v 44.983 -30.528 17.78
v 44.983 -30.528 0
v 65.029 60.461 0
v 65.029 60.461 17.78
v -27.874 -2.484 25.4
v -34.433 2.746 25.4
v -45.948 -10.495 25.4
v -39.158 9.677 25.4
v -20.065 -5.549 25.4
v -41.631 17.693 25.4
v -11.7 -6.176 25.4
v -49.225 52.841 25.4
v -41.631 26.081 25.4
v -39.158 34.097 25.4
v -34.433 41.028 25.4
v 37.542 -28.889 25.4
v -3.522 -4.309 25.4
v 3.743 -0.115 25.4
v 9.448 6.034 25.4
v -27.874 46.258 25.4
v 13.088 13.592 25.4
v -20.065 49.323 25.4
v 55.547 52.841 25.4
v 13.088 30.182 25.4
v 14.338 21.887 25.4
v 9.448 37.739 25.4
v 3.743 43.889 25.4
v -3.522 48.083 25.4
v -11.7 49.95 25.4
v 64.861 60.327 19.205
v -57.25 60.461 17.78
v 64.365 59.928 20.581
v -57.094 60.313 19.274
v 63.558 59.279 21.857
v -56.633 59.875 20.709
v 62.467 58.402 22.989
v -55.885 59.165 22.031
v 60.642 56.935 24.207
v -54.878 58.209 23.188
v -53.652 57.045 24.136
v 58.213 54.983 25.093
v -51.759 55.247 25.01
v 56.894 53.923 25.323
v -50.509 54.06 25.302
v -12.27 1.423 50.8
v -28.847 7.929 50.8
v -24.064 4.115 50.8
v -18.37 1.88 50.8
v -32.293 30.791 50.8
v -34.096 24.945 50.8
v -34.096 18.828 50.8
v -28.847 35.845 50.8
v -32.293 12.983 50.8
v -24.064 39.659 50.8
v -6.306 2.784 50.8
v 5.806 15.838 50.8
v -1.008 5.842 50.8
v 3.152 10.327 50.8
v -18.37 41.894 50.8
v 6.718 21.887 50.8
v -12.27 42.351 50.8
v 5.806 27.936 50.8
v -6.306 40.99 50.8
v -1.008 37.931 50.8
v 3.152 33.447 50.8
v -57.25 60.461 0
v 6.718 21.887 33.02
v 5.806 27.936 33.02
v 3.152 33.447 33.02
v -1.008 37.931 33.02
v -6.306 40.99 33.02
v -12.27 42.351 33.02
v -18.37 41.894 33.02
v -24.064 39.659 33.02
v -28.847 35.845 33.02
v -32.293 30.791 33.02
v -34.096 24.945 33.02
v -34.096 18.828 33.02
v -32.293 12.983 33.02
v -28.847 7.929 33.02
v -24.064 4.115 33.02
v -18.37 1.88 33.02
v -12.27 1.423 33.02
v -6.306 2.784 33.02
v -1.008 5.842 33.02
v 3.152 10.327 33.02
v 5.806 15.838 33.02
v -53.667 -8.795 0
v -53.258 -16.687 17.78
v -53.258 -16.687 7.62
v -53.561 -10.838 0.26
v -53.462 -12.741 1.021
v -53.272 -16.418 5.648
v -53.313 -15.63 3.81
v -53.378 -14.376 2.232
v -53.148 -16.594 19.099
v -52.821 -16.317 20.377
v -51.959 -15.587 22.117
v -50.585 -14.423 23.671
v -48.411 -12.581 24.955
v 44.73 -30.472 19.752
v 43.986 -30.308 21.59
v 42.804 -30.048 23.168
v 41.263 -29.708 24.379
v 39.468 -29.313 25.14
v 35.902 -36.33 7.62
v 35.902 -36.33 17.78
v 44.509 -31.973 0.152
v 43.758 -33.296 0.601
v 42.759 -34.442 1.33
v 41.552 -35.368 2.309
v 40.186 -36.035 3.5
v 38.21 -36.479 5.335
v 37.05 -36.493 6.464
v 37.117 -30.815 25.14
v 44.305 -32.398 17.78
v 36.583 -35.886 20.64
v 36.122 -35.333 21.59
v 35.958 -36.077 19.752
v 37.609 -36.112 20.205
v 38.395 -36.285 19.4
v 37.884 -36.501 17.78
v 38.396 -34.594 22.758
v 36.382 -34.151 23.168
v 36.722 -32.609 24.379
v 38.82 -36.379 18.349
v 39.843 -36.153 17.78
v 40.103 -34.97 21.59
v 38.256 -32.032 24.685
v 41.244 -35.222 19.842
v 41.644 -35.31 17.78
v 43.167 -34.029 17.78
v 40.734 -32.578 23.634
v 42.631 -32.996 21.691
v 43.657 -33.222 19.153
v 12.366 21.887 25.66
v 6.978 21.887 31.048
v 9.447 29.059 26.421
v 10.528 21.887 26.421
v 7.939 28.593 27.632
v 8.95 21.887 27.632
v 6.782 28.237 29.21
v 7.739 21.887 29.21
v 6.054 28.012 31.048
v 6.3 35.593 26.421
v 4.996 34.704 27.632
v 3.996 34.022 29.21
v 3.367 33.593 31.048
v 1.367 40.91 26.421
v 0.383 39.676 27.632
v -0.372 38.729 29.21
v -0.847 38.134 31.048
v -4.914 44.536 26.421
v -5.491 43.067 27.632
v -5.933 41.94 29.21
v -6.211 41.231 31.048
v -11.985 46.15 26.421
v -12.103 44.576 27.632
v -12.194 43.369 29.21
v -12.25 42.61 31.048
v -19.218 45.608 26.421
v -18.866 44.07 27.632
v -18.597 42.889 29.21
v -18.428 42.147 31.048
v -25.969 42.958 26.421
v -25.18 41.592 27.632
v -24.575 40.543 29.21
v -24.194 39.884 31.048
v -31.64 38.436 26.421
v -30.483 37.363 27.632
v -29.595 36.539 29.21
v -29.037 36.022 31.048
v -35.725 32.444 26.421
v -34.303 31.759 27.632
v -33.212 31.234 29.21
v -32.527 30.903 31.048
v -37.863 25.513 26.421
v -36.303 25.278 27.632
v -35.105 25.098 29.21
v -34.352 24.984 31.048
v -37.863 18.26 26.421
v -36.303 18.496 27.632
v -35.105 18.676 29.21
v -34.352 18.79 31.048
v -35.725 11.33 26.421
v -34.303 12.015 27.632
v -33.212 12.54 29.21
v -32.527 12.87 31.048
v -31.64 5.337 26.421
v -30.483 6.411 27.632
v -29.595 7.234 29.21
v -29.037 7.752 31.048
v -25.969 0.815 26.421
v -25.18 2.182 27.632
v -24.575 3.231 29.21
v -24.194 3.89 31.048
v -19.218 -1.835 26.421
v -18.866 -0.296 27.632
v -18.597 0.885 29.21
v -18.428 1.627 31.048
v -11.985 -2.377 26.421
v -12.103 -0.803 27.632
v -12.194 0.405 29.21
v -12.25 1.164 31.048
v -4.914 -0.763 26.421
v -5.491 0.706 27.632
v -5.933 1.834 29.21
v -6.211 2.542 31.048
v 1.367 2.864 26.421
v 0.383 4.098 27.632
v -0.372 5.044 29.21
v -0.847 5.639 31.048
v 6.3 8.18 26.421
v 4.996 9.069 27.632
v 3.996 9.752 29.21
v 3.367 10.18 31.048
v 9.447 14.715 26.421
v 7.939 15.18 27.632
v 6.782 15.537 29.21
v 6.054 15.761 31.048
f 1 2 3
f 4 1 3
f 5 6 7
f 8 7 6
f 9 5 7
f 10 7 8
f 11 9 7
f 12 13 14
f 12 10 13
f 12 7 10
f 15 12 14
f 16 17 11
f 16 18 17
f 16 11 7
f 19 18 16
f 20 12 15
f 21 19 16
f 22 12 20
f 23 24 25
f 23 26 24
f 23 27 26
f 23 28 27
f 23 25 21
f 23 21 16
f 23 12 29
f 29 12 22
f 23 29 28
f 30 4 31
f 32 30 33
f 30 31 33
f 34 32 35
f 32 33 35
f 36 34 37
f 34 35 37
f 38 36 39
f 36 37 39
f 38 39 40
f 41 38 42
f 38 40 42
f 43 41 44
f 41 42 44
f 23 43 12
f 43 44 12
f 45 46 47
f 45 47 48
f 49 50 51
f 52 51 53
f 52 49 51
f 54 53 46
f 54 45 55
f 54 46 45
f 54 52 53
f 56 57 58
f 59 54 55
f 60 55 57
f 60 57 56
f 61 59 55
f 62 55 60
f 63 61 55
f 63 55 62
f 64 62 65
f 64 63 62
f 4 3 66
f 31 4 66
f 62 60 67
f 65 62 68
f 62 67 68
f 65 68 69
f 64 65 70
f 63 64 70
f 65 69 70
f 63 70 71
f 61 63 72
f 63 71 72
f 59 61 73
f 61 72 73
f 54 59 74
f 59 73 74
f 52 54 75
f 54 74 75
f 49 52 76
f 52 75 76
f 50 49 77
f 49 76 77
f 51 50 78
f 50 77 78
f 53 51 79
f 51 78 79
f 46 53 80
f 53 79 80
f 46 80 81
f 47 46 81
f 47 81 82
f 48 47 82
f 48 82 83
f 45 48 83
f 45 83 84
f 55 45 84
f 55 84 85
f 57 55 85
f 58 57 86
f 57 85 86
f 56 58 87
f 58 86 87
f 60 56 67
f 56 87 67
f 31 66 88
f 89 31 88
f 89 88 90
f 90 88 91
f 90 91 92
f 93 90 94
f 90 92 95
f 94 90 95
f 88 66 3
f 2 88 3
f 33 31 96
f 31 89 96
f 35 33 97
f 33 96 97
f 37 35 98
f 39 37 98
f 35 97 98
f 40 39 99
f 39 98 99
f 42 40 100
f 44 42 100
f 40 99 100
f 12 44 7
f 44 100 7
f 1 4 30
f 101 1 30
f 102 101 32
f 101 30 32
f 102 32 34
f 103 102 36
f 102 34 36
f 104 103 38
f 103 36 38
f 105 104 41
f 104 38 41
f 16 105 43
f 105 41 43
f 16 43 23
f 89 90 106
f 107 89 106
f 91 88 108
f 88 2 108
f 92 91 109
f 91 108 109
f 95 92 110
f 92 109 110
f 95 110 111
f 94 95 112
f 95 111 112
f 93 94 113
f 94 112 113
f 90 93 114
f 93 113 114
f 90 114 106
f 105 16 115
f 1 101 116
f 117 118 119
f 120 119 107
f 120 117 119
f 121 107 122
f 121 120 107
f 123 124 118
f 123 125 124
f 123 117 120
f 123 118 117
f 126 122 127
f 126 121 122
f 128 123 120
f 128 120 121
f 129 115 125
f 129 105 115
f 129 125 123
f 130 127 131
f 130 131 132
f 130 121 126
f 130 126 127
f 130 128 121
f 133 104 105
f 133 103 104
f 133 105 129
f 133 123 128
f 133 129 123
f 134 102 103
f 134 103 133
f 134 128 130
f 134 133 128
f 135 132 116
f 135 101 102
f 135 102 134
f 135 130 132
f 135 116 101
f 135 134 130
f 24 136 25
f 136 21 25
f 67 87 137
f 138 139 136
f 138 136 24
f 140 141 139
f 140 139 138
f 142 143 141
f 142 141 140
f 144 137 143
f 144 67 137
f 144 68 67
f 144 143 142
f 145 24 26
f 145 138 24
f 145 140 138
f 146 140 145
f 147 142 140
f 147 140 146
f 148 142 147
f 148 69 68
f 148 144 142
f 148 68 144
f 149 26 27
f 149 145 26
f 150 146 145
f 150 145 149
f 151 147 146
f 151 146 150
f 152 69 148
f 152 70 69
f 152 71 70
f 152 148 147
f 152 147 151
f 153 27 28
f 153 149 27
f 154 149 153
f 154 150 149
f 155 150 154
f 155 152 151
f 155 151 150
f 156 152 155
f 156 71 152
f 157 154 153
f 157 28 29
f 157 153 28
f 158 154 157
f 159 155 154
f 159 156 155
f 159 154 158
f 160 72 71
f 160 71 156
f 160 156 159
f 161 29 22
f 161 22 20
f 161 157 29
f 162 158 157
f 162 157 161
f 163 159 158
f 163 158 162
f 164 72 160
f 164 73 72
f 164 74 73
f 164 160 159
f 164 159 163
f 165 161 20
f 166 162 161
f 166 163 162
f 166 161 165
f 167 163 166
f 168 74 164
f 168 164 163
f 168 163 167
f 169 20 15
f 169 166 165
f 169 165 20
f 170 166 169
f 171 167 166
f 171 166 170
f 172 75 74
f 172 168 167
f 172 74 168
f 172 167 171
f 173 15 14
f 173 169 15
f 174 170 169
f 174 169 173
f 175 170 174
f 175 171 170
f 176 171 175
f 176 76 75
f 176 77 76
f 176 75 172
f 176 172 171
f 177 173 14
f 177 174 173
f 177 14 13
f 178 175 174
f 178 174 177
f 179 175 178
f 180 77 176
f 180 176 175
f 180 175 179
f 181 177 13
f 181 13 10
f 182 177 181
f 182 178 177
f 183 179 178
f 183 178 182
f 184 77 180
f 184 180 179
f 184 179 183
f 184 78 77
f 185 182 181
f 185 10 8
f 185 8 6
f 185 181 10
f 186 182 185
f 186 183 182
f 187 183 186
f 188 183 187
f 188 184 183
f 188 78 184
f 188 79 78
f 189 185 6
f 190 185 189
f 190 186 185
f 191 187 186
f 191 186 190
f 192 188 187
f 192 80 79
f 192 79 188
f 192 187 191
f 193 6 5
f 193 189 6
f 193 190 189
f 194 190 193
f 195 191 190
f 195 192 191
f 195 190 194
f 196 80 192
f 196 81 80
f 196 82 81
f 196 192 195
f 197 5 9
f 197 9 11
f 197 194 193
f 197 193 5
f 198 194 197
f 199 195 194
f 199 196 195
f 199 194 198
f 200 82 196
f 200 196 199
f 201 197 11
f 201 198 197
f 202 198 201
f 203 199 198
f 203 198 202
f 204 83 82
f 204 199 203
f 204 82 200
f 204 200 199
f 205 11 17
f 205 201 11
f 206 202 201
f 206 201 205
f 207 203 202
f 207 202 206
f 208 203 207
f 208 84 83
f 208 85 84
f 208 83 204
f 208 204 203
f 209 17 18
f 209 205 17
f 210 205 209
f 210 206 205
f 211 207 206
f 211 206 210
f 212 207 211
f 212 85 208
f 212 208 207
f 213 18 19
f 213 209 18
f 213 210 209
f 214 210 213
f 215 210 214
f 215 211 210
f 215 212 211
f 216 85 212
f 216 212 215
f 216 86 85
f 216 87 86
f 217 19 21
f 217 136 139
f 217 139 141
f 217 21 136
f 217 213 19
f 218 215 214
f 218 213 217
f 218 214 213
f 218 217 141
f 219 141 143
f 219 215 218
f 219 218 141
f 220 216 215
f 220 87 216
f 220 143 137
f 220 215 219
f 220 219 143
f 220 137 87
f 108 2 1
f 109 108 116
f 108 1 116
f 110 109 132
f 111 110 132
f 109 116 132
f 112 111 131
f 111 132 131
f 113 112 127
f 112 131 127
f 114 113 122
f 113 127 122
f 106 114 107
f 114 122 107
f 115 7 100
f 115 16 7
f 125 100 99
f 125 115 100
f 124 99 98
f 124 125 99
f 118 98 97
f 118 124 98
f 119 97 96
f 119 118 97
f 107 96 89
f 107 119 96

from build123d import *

# Parameters (mm, degrees)
F1_DEPTH = 25.4
F2_R     = 20.5214520654
F3_DEPTH = 25.4
F4_R     = 7.62


# Not quite as in the source:
# - the program builds the solid bodies; features that only make, move or delete a surface that nothing else refers to are left out


with BuildPart() as f1:
    # F0 (on Top) → F1 (new body)
    with BuildSketch(Plane.XY):
        Polygon((65.0288537145, 60.4610182345), (-57.2496131063, 60.4610182345), (-53.2582976497, -16.6874233163), (43.3438569307, -37.969596684), align=None)
    extrude(amount=F1_DEPTH)

    # F2 (on face) → F3 (join)
    with BuildSketch(Plane.XY.offset(25.4)):
        with Locations((-13.8034075499, 21.8867974591)):
            Circle(F2_R)
    extrude(amount=F3_DEPTH)

    # F4
    f4_edges = [f1.edges().sort_by_distance(p)[0] for p in [
        (54.186355, 11.245711, 25.4),
        (-4.95722, -27.32851, 25.4),
        (3.88962, 60.461018, 25.4),
        (-55.253955, 21.886797, 25.4),
        (-34.32486, 21.886797, 25.4),
        (43.343857, -37.969597, 12.7),
        (-4.95722, -27.32851, 0),
    ]]
    fillet(f4_edges, radius=F4_R)


solid = f1.part
